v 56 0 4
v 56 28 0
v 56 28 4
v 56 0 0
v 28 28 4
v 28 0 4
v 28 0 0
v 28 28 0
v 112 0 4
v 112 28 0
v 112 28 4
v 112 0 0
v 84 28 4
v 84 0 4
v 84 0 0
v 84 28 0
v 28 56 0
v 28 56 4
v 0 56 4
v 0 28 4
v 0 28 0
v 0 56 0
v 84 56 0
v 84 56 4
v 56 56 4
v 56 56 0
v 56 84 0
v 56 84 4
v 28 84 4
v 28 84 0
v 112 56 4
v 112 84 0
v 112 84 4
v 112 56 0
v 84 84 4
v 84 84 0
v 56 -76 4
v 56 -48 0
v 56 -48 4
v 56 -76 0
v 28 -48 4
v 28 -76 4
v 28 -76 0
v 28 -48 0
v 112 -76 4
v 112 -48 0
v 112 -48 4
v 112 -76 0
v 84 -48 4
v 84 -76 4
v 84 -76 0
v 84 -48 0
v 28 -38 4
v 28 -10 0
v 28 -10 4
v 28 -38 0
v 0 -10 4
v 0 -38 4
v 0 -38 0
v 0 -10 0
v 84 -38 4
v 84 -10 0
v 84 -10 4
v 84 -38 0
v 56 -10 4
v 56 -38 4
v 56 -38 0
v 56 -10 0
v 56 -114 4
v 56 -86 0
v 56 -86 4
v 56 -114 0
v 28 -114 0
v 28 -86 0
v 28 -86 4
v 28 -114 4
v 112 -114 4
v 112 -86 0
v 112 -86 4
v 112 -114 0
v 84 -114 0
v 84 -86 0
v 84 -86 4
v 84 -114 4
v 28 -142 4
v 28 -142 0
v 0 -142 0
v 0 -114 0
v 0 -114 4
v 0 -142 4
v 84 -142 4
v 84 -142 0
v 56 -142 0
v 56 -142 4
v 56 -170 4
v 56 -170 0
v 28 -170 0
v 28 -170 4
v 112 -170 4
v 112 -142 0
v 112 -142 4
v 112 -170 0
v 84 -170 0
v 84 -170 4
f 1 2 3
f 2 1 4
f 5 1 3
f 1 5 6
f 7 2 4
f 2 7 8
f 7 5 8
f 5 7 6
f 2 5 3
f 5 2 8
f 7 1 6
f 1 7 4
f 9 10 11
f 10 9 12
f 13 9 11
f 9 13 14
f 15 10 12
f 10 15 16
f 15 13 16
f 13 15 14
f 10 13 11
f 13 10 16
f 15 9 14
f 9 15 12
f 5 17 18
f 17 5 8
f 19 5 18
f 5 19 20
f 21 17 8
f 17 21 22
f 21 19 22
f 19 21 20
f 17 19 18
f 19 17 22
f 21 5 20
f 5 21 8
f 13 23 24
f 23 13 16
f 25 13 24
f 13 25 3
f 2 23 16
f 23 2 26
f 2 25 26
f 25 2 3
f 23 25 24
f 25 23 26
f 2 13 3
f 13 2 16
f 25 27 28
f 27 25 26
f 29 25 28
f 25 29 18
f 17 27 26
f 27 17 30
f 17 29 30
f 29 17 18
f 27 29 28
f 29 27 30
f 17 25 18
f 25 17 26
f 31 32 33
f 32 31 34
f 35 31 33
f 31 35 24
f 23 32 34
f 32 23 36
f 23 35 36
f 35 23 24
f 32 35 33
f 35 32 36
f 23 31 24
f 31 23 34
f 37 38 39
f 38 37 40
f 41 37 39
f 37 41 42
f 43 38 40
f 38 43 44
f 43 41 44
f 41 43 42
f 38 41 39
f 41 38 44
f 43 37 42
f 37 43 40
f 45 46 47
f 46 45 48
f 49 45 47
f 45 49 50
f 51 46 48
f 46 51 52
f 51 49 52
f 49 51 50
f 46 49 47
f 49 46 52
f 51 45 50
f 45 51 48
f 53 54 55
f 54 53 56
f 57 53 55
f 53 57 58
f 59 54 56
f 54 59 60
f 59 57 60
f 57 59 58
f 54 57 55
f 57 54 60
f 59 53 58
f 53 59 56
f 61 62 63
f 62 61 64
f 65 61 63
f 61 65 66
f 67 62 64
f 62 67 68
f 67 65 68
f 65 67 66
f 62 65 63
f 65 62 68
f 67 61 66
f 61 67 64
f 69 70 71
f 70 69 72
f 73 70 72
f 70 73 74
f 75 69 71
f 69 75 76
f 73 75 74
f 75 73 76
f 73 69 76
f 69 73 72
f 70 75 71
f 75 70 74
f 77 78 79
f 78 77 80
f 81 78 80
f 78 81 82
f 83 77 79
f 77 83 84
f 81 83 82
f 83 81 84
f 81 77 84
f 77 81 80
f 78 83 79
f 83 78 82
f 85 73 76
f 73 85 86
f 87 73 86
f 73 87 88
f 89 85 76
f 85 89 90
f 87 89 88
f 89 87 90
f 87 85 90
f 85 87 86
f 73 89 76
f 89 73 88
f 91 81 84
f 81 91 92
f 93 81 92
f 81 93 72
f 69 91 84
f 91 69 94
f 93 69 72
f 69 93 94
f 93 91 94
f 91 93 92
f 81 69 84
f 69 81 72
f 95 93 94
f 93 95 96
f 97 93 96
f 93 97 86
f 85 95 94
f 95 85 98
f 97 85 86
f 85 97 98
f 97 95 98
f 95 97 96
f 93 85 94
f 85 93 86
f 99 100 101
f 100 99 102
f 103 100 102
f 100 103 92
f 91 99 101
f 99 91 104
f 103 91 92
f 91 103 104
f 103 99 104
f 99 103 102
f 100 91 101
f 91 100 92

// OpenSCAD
// Customizable Martian Chess Board
// Copyright: Olle Wreede 2021
// License: CC BY-SA

//CUSTOMIZER VARIABLES

/* [Board] */

// Width in mm of each square
width_of_square = 28; // [20:0.5:35]

// Thickness in mm of board
thickness_of_board = 4; // [3:1:10]

// Width in mm of line between board sides
width_of_middle_line = 10; // [0:0.5:15]

// Width in mm of edges around squares
width_of_edges = 2; // [0:1:10]

// Radius of corners of board in mm
radius_of_board_corners = 2; // [0:0.2:5]

// Color of edges
color_of_edges = "purple";

// Color of black squares
color_of_black = "black";

// Color of white squares
color_of_white = "red";

// Distance between parts of board
distance_between_parts = 10; // [0:1:20]

/* [Displayed parts] */

show_left_board = true;
show_middle_board = true;
show_right_board = true;
show_black_squares = false;
show_white_squares = true;
show_edges = false;

//CUSTOMIZER VARIABLES END

/* [Hidden] */

$fn = 20;
fudge = 0.01;

module fillet(r, h) {
    translate([r / 2, r / 2, 0])
    difference() {
        cube([r + fudge, r + fudge, h], center = true);

        translate([r/2, r/2, 0])
        cylinder(r = r, h = h + 1, center = true);
    }
}

module board_square(side, thickness, col) {
    color(col, 1.0)
    cube(size = [side, side, thickness], center = false);
}

module board_line(side, thickness, col, off = false) {
    off_distance = off ? side : 0;
    translate([off_distance, 0, 0])    
    board_square(side, thickness, col);
    translate([off_distance + side * 2, 0, 0])    
    board_square(side, thickness, col);
}

module board_4x3(
    side,
    thickness,
    col,
    off) {
    board_line(side, thickness, col, off);

    translate([0, side, 0])
    board_line(side, thickness, col, !off);
    
    translate([0, side * 2, 0])
    board_line(side, thickness, col, off);
}

module board_edge_4x3(
    side,
    thickness,
    edge,
    edge_col,
    radius) {
    color(edge_col, 1.0) {
        difference() {
            translate([-edge, 0, 0])
            cube(size = [
                side * 4 + edge * 2,
                side * 3 + edge,
                thickness],
                center = false);

            translate([0, -fudge, -fudge])
            cube(size = [
                side * 4,
                side * 3 + fudge,
                thickness + fudge * 2],
                center = false);

            // Rounded corners
            translate([
                -edge,
                side * 3 + radius,
                thickness / 2])
            rotate([0, 0, 270])
            fillet(radius*2, thickness + fudge * 2);
            translate([
                side * 4 + radius,
                side * 3 + radius,
                thickness / 2])
            rotate([0, 0, 180])
            fillet(radius, thickness + fudge * 2);
        }
    }
}

module board_edge_middle(
    side,
    thickness,
    middle,
    edge,
    edge_col) {
    color(edge_col, 1.0) {
        difference() {
            translate([-edge, 0, 0])
            cube(size = [
                side * 4 + edge * 2,
                side * 2 + middle,
                thickness],
                center = false);

            translate([0, -fudge, -fudge])
            cube(size = [
                side * 4,
                side * 2 + middle + fudge * 2,
                thickness + fudge * 2],
                center = false);
        }
        
        // Middle line
        translate([0, side, 0])
        color(edge_col, 1.0)
        cube(size = [side * 4, middle, thickness], center = false);
    }
}

module board_middle(side, thickness, middle, square_col, off) {
    board_line(side, thickness, square_col, off);

    translate([0, side + middle, 0])
    board_line(side, thickness, square_col, !off);
}



// Left board
if (show_left_board) {
    if (show_edges) {
        board_edge_4x3(
            width_of_square,
            thickness_of_board,
            width_of_edges,
            color_of_edges,
            radius_of_board_corners);
    }
    if (show_black_squares) {
        board_4x3(
            width_of_square,
            thickness_of_board,
            color_of_black,
            false);
    }
    if (show_white_squares) {
        board_4x3(
            width_of_square,
            thickness_of_board,
            color_of_white,
            true);
    }
}

if (show_middle_board) {
    translate([0, - width_of_square * 2 - width_of_middle_line - distance_between_parts, 0]) {
        if (show_edges) {
            board_edge_middle(
                width_of_square,
                thickness_of_board,
                width_of_middle_line,
                width_of_edges,
                color_of_edges);
        }
        if (show_black_squares) {
            board_middle(
                width_of_square,
                thickness_of_board,
                width_of_middle_line,
                color_of_black,
                false);
        }
        if (show_white_squares) {
            board_middle(
                width_of_square,
                thickness_of_board,
                width_of_middle_line,
                color_of_white,
                true);
        }
    }
}

// Right board
if (show_right_board) {
    translate([0, 
    - width_of_square * 2 - width_of_middle_line - distance_between_parts * 2, thickness_of_board])
    rotate([-180, 0, 0])
    
     {
        if (show_edges) {
            board_edge_4x3(
                width_of_square,
                thickness_of_board,
                width_of_edges,
                color_of_edges,
                radius_of_board_corners);
        }
        if (show_black_squares) {
            board_4x3(
                width_of_square,
                thickness_of_board,
                color_of_black,
                false);
        }
        if (show_white_squares) {
            board_4x3(
                width_of_square,
                thickness_of_board,
                color_of_white,
                true);
        }
    }
}
